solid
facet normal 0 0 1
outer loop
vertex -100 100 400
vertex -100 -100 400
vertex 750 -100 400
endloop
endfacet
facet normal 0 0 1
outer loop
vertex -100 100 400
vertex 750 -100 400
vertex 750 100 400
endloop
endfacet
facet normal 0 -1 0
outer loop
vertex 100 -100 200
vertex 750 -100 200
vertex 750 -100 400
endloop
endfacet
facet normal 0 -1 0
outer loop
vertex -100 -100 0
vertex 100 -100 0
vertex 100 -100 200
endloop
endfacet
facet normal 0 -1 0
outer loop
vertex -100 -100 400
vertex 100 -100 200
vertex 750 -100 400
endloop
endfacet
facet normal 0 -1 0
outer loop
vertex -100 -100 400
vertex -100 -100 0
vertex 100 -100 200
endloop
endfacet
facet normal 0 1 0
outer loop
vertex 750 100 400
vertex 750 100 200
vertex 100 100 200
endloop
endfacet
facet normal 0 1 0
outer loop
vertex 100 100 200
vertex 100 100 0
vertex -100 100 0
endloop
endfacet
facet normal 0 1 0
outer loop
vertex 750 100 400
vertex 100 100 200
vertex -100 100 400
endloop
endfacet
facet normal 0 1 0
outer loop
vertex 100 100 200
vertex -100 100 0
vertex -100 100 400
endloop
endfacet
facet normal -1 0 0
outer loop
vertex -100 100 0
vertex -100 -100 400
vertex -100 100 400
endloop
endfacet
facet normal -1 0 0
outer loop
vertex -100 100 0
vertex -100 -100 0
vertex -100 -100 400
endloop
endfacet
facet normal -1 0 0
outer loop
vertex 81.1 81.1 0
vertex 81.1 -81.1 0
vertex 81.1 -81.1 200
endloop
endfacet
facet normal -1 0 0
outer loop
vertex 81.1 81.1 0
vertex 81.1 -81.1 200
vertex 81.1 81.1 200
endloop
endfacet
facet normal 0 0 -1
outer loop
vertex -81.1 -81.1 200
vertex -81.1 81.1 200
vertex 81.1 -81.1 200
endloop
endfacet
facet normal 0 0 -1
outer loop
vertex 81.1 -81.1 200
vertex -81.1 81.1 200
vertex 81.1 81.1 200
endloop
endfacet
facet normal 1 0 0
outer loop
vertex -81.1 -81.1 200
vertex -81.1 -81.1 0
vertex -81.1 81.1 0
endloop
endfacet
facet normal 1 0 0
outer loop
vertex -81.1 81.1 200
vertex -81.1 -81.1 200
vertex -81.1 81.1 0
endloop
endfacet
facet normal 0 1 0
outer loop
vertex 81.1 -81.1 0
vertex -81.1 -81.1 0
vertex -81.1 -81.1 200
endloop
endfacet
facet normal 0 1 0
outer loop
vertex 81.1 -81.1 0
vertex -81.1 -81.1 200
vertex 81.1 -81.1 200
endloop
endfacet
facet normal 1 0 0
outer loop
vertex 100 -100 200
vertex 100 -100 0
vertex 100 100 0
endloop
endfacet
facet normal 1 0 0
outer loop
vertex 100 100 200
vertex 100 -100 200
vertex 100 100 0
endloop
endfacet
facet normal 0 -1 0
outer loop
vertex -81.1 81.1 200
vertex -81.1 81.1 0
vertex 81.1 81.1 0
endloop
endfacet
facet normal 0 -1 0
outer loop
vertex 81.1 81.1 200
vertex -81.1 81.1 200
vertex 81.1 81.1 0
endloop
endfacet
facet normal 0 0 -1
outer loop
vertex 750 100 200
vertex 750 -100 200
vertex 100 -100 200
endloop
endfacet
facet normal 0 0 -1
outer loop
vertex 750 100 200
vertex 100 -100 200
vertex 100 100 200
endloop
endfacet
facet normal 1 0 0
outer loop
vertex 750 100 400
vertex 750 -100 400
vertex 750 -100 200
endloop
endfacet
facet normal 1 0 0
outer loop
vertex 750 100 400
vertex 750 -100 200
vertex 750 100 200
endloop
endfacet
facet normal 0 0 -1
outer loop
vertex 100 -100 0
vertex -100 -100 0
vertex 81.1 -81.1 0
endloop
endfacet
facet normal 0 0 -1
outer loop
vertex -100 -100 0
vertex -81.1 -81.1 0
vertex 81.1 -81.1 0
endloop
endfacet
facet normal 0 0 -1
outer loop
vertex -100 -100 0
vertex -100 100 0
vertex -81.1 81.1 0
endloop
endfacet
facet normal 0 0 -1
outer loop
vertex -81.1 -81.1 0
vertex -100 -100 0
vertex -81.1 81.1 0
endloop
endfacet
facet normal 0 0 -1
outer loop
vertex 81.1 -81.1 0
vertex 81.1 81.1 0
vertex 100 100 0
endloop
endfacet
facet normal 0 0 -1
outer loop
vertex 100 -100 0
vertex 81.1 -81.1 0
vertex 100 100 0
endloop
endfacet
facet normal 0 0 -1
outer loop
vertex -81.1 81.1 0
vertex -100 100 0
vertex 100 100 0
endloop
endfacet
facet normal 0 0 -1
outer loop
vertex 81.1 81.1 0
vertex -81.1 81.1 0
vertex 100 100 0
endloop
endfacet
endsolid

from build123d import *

# Parameters (mm, degrees)
F0_W     = 200
F0_H     = 200
F0_W_2   = 162.2
F0_H_2   = 162.2
F1_DEPTH = 200
F2_W     = 200
F2_H     = 200
F3_DEPTH = 200
F4_W     = 200
F4_H     = 200
F5_DEPTH = 650


with BuildPart() as f1:
    # F0 (on Top) → F1 (new body)
    with BuildSketch(Plane.XY):
        Rectangle(F0_W, F0_H)
        Rectangle(F0_W_2, F0_H_2, mode=Mode.SUBTRACT)
    extrude(amount=F1_DEPTH)

    # F2 (on face) → F3 (join)
    with BuildSketch(Plane.XY.offset(200)):
        Rectangle(F2_W, F2_H)
    extrude(amount=F3_DEPTH)

    # F4 (on face) → F5 (join)
    with BuildSketch(Plane.YZ.offset(100)):
        with Locations((0, 300)):
            Rectangle(F4_W, F4_H)
    extrude(amount=F5_DEPTH)


solid = f1.part
